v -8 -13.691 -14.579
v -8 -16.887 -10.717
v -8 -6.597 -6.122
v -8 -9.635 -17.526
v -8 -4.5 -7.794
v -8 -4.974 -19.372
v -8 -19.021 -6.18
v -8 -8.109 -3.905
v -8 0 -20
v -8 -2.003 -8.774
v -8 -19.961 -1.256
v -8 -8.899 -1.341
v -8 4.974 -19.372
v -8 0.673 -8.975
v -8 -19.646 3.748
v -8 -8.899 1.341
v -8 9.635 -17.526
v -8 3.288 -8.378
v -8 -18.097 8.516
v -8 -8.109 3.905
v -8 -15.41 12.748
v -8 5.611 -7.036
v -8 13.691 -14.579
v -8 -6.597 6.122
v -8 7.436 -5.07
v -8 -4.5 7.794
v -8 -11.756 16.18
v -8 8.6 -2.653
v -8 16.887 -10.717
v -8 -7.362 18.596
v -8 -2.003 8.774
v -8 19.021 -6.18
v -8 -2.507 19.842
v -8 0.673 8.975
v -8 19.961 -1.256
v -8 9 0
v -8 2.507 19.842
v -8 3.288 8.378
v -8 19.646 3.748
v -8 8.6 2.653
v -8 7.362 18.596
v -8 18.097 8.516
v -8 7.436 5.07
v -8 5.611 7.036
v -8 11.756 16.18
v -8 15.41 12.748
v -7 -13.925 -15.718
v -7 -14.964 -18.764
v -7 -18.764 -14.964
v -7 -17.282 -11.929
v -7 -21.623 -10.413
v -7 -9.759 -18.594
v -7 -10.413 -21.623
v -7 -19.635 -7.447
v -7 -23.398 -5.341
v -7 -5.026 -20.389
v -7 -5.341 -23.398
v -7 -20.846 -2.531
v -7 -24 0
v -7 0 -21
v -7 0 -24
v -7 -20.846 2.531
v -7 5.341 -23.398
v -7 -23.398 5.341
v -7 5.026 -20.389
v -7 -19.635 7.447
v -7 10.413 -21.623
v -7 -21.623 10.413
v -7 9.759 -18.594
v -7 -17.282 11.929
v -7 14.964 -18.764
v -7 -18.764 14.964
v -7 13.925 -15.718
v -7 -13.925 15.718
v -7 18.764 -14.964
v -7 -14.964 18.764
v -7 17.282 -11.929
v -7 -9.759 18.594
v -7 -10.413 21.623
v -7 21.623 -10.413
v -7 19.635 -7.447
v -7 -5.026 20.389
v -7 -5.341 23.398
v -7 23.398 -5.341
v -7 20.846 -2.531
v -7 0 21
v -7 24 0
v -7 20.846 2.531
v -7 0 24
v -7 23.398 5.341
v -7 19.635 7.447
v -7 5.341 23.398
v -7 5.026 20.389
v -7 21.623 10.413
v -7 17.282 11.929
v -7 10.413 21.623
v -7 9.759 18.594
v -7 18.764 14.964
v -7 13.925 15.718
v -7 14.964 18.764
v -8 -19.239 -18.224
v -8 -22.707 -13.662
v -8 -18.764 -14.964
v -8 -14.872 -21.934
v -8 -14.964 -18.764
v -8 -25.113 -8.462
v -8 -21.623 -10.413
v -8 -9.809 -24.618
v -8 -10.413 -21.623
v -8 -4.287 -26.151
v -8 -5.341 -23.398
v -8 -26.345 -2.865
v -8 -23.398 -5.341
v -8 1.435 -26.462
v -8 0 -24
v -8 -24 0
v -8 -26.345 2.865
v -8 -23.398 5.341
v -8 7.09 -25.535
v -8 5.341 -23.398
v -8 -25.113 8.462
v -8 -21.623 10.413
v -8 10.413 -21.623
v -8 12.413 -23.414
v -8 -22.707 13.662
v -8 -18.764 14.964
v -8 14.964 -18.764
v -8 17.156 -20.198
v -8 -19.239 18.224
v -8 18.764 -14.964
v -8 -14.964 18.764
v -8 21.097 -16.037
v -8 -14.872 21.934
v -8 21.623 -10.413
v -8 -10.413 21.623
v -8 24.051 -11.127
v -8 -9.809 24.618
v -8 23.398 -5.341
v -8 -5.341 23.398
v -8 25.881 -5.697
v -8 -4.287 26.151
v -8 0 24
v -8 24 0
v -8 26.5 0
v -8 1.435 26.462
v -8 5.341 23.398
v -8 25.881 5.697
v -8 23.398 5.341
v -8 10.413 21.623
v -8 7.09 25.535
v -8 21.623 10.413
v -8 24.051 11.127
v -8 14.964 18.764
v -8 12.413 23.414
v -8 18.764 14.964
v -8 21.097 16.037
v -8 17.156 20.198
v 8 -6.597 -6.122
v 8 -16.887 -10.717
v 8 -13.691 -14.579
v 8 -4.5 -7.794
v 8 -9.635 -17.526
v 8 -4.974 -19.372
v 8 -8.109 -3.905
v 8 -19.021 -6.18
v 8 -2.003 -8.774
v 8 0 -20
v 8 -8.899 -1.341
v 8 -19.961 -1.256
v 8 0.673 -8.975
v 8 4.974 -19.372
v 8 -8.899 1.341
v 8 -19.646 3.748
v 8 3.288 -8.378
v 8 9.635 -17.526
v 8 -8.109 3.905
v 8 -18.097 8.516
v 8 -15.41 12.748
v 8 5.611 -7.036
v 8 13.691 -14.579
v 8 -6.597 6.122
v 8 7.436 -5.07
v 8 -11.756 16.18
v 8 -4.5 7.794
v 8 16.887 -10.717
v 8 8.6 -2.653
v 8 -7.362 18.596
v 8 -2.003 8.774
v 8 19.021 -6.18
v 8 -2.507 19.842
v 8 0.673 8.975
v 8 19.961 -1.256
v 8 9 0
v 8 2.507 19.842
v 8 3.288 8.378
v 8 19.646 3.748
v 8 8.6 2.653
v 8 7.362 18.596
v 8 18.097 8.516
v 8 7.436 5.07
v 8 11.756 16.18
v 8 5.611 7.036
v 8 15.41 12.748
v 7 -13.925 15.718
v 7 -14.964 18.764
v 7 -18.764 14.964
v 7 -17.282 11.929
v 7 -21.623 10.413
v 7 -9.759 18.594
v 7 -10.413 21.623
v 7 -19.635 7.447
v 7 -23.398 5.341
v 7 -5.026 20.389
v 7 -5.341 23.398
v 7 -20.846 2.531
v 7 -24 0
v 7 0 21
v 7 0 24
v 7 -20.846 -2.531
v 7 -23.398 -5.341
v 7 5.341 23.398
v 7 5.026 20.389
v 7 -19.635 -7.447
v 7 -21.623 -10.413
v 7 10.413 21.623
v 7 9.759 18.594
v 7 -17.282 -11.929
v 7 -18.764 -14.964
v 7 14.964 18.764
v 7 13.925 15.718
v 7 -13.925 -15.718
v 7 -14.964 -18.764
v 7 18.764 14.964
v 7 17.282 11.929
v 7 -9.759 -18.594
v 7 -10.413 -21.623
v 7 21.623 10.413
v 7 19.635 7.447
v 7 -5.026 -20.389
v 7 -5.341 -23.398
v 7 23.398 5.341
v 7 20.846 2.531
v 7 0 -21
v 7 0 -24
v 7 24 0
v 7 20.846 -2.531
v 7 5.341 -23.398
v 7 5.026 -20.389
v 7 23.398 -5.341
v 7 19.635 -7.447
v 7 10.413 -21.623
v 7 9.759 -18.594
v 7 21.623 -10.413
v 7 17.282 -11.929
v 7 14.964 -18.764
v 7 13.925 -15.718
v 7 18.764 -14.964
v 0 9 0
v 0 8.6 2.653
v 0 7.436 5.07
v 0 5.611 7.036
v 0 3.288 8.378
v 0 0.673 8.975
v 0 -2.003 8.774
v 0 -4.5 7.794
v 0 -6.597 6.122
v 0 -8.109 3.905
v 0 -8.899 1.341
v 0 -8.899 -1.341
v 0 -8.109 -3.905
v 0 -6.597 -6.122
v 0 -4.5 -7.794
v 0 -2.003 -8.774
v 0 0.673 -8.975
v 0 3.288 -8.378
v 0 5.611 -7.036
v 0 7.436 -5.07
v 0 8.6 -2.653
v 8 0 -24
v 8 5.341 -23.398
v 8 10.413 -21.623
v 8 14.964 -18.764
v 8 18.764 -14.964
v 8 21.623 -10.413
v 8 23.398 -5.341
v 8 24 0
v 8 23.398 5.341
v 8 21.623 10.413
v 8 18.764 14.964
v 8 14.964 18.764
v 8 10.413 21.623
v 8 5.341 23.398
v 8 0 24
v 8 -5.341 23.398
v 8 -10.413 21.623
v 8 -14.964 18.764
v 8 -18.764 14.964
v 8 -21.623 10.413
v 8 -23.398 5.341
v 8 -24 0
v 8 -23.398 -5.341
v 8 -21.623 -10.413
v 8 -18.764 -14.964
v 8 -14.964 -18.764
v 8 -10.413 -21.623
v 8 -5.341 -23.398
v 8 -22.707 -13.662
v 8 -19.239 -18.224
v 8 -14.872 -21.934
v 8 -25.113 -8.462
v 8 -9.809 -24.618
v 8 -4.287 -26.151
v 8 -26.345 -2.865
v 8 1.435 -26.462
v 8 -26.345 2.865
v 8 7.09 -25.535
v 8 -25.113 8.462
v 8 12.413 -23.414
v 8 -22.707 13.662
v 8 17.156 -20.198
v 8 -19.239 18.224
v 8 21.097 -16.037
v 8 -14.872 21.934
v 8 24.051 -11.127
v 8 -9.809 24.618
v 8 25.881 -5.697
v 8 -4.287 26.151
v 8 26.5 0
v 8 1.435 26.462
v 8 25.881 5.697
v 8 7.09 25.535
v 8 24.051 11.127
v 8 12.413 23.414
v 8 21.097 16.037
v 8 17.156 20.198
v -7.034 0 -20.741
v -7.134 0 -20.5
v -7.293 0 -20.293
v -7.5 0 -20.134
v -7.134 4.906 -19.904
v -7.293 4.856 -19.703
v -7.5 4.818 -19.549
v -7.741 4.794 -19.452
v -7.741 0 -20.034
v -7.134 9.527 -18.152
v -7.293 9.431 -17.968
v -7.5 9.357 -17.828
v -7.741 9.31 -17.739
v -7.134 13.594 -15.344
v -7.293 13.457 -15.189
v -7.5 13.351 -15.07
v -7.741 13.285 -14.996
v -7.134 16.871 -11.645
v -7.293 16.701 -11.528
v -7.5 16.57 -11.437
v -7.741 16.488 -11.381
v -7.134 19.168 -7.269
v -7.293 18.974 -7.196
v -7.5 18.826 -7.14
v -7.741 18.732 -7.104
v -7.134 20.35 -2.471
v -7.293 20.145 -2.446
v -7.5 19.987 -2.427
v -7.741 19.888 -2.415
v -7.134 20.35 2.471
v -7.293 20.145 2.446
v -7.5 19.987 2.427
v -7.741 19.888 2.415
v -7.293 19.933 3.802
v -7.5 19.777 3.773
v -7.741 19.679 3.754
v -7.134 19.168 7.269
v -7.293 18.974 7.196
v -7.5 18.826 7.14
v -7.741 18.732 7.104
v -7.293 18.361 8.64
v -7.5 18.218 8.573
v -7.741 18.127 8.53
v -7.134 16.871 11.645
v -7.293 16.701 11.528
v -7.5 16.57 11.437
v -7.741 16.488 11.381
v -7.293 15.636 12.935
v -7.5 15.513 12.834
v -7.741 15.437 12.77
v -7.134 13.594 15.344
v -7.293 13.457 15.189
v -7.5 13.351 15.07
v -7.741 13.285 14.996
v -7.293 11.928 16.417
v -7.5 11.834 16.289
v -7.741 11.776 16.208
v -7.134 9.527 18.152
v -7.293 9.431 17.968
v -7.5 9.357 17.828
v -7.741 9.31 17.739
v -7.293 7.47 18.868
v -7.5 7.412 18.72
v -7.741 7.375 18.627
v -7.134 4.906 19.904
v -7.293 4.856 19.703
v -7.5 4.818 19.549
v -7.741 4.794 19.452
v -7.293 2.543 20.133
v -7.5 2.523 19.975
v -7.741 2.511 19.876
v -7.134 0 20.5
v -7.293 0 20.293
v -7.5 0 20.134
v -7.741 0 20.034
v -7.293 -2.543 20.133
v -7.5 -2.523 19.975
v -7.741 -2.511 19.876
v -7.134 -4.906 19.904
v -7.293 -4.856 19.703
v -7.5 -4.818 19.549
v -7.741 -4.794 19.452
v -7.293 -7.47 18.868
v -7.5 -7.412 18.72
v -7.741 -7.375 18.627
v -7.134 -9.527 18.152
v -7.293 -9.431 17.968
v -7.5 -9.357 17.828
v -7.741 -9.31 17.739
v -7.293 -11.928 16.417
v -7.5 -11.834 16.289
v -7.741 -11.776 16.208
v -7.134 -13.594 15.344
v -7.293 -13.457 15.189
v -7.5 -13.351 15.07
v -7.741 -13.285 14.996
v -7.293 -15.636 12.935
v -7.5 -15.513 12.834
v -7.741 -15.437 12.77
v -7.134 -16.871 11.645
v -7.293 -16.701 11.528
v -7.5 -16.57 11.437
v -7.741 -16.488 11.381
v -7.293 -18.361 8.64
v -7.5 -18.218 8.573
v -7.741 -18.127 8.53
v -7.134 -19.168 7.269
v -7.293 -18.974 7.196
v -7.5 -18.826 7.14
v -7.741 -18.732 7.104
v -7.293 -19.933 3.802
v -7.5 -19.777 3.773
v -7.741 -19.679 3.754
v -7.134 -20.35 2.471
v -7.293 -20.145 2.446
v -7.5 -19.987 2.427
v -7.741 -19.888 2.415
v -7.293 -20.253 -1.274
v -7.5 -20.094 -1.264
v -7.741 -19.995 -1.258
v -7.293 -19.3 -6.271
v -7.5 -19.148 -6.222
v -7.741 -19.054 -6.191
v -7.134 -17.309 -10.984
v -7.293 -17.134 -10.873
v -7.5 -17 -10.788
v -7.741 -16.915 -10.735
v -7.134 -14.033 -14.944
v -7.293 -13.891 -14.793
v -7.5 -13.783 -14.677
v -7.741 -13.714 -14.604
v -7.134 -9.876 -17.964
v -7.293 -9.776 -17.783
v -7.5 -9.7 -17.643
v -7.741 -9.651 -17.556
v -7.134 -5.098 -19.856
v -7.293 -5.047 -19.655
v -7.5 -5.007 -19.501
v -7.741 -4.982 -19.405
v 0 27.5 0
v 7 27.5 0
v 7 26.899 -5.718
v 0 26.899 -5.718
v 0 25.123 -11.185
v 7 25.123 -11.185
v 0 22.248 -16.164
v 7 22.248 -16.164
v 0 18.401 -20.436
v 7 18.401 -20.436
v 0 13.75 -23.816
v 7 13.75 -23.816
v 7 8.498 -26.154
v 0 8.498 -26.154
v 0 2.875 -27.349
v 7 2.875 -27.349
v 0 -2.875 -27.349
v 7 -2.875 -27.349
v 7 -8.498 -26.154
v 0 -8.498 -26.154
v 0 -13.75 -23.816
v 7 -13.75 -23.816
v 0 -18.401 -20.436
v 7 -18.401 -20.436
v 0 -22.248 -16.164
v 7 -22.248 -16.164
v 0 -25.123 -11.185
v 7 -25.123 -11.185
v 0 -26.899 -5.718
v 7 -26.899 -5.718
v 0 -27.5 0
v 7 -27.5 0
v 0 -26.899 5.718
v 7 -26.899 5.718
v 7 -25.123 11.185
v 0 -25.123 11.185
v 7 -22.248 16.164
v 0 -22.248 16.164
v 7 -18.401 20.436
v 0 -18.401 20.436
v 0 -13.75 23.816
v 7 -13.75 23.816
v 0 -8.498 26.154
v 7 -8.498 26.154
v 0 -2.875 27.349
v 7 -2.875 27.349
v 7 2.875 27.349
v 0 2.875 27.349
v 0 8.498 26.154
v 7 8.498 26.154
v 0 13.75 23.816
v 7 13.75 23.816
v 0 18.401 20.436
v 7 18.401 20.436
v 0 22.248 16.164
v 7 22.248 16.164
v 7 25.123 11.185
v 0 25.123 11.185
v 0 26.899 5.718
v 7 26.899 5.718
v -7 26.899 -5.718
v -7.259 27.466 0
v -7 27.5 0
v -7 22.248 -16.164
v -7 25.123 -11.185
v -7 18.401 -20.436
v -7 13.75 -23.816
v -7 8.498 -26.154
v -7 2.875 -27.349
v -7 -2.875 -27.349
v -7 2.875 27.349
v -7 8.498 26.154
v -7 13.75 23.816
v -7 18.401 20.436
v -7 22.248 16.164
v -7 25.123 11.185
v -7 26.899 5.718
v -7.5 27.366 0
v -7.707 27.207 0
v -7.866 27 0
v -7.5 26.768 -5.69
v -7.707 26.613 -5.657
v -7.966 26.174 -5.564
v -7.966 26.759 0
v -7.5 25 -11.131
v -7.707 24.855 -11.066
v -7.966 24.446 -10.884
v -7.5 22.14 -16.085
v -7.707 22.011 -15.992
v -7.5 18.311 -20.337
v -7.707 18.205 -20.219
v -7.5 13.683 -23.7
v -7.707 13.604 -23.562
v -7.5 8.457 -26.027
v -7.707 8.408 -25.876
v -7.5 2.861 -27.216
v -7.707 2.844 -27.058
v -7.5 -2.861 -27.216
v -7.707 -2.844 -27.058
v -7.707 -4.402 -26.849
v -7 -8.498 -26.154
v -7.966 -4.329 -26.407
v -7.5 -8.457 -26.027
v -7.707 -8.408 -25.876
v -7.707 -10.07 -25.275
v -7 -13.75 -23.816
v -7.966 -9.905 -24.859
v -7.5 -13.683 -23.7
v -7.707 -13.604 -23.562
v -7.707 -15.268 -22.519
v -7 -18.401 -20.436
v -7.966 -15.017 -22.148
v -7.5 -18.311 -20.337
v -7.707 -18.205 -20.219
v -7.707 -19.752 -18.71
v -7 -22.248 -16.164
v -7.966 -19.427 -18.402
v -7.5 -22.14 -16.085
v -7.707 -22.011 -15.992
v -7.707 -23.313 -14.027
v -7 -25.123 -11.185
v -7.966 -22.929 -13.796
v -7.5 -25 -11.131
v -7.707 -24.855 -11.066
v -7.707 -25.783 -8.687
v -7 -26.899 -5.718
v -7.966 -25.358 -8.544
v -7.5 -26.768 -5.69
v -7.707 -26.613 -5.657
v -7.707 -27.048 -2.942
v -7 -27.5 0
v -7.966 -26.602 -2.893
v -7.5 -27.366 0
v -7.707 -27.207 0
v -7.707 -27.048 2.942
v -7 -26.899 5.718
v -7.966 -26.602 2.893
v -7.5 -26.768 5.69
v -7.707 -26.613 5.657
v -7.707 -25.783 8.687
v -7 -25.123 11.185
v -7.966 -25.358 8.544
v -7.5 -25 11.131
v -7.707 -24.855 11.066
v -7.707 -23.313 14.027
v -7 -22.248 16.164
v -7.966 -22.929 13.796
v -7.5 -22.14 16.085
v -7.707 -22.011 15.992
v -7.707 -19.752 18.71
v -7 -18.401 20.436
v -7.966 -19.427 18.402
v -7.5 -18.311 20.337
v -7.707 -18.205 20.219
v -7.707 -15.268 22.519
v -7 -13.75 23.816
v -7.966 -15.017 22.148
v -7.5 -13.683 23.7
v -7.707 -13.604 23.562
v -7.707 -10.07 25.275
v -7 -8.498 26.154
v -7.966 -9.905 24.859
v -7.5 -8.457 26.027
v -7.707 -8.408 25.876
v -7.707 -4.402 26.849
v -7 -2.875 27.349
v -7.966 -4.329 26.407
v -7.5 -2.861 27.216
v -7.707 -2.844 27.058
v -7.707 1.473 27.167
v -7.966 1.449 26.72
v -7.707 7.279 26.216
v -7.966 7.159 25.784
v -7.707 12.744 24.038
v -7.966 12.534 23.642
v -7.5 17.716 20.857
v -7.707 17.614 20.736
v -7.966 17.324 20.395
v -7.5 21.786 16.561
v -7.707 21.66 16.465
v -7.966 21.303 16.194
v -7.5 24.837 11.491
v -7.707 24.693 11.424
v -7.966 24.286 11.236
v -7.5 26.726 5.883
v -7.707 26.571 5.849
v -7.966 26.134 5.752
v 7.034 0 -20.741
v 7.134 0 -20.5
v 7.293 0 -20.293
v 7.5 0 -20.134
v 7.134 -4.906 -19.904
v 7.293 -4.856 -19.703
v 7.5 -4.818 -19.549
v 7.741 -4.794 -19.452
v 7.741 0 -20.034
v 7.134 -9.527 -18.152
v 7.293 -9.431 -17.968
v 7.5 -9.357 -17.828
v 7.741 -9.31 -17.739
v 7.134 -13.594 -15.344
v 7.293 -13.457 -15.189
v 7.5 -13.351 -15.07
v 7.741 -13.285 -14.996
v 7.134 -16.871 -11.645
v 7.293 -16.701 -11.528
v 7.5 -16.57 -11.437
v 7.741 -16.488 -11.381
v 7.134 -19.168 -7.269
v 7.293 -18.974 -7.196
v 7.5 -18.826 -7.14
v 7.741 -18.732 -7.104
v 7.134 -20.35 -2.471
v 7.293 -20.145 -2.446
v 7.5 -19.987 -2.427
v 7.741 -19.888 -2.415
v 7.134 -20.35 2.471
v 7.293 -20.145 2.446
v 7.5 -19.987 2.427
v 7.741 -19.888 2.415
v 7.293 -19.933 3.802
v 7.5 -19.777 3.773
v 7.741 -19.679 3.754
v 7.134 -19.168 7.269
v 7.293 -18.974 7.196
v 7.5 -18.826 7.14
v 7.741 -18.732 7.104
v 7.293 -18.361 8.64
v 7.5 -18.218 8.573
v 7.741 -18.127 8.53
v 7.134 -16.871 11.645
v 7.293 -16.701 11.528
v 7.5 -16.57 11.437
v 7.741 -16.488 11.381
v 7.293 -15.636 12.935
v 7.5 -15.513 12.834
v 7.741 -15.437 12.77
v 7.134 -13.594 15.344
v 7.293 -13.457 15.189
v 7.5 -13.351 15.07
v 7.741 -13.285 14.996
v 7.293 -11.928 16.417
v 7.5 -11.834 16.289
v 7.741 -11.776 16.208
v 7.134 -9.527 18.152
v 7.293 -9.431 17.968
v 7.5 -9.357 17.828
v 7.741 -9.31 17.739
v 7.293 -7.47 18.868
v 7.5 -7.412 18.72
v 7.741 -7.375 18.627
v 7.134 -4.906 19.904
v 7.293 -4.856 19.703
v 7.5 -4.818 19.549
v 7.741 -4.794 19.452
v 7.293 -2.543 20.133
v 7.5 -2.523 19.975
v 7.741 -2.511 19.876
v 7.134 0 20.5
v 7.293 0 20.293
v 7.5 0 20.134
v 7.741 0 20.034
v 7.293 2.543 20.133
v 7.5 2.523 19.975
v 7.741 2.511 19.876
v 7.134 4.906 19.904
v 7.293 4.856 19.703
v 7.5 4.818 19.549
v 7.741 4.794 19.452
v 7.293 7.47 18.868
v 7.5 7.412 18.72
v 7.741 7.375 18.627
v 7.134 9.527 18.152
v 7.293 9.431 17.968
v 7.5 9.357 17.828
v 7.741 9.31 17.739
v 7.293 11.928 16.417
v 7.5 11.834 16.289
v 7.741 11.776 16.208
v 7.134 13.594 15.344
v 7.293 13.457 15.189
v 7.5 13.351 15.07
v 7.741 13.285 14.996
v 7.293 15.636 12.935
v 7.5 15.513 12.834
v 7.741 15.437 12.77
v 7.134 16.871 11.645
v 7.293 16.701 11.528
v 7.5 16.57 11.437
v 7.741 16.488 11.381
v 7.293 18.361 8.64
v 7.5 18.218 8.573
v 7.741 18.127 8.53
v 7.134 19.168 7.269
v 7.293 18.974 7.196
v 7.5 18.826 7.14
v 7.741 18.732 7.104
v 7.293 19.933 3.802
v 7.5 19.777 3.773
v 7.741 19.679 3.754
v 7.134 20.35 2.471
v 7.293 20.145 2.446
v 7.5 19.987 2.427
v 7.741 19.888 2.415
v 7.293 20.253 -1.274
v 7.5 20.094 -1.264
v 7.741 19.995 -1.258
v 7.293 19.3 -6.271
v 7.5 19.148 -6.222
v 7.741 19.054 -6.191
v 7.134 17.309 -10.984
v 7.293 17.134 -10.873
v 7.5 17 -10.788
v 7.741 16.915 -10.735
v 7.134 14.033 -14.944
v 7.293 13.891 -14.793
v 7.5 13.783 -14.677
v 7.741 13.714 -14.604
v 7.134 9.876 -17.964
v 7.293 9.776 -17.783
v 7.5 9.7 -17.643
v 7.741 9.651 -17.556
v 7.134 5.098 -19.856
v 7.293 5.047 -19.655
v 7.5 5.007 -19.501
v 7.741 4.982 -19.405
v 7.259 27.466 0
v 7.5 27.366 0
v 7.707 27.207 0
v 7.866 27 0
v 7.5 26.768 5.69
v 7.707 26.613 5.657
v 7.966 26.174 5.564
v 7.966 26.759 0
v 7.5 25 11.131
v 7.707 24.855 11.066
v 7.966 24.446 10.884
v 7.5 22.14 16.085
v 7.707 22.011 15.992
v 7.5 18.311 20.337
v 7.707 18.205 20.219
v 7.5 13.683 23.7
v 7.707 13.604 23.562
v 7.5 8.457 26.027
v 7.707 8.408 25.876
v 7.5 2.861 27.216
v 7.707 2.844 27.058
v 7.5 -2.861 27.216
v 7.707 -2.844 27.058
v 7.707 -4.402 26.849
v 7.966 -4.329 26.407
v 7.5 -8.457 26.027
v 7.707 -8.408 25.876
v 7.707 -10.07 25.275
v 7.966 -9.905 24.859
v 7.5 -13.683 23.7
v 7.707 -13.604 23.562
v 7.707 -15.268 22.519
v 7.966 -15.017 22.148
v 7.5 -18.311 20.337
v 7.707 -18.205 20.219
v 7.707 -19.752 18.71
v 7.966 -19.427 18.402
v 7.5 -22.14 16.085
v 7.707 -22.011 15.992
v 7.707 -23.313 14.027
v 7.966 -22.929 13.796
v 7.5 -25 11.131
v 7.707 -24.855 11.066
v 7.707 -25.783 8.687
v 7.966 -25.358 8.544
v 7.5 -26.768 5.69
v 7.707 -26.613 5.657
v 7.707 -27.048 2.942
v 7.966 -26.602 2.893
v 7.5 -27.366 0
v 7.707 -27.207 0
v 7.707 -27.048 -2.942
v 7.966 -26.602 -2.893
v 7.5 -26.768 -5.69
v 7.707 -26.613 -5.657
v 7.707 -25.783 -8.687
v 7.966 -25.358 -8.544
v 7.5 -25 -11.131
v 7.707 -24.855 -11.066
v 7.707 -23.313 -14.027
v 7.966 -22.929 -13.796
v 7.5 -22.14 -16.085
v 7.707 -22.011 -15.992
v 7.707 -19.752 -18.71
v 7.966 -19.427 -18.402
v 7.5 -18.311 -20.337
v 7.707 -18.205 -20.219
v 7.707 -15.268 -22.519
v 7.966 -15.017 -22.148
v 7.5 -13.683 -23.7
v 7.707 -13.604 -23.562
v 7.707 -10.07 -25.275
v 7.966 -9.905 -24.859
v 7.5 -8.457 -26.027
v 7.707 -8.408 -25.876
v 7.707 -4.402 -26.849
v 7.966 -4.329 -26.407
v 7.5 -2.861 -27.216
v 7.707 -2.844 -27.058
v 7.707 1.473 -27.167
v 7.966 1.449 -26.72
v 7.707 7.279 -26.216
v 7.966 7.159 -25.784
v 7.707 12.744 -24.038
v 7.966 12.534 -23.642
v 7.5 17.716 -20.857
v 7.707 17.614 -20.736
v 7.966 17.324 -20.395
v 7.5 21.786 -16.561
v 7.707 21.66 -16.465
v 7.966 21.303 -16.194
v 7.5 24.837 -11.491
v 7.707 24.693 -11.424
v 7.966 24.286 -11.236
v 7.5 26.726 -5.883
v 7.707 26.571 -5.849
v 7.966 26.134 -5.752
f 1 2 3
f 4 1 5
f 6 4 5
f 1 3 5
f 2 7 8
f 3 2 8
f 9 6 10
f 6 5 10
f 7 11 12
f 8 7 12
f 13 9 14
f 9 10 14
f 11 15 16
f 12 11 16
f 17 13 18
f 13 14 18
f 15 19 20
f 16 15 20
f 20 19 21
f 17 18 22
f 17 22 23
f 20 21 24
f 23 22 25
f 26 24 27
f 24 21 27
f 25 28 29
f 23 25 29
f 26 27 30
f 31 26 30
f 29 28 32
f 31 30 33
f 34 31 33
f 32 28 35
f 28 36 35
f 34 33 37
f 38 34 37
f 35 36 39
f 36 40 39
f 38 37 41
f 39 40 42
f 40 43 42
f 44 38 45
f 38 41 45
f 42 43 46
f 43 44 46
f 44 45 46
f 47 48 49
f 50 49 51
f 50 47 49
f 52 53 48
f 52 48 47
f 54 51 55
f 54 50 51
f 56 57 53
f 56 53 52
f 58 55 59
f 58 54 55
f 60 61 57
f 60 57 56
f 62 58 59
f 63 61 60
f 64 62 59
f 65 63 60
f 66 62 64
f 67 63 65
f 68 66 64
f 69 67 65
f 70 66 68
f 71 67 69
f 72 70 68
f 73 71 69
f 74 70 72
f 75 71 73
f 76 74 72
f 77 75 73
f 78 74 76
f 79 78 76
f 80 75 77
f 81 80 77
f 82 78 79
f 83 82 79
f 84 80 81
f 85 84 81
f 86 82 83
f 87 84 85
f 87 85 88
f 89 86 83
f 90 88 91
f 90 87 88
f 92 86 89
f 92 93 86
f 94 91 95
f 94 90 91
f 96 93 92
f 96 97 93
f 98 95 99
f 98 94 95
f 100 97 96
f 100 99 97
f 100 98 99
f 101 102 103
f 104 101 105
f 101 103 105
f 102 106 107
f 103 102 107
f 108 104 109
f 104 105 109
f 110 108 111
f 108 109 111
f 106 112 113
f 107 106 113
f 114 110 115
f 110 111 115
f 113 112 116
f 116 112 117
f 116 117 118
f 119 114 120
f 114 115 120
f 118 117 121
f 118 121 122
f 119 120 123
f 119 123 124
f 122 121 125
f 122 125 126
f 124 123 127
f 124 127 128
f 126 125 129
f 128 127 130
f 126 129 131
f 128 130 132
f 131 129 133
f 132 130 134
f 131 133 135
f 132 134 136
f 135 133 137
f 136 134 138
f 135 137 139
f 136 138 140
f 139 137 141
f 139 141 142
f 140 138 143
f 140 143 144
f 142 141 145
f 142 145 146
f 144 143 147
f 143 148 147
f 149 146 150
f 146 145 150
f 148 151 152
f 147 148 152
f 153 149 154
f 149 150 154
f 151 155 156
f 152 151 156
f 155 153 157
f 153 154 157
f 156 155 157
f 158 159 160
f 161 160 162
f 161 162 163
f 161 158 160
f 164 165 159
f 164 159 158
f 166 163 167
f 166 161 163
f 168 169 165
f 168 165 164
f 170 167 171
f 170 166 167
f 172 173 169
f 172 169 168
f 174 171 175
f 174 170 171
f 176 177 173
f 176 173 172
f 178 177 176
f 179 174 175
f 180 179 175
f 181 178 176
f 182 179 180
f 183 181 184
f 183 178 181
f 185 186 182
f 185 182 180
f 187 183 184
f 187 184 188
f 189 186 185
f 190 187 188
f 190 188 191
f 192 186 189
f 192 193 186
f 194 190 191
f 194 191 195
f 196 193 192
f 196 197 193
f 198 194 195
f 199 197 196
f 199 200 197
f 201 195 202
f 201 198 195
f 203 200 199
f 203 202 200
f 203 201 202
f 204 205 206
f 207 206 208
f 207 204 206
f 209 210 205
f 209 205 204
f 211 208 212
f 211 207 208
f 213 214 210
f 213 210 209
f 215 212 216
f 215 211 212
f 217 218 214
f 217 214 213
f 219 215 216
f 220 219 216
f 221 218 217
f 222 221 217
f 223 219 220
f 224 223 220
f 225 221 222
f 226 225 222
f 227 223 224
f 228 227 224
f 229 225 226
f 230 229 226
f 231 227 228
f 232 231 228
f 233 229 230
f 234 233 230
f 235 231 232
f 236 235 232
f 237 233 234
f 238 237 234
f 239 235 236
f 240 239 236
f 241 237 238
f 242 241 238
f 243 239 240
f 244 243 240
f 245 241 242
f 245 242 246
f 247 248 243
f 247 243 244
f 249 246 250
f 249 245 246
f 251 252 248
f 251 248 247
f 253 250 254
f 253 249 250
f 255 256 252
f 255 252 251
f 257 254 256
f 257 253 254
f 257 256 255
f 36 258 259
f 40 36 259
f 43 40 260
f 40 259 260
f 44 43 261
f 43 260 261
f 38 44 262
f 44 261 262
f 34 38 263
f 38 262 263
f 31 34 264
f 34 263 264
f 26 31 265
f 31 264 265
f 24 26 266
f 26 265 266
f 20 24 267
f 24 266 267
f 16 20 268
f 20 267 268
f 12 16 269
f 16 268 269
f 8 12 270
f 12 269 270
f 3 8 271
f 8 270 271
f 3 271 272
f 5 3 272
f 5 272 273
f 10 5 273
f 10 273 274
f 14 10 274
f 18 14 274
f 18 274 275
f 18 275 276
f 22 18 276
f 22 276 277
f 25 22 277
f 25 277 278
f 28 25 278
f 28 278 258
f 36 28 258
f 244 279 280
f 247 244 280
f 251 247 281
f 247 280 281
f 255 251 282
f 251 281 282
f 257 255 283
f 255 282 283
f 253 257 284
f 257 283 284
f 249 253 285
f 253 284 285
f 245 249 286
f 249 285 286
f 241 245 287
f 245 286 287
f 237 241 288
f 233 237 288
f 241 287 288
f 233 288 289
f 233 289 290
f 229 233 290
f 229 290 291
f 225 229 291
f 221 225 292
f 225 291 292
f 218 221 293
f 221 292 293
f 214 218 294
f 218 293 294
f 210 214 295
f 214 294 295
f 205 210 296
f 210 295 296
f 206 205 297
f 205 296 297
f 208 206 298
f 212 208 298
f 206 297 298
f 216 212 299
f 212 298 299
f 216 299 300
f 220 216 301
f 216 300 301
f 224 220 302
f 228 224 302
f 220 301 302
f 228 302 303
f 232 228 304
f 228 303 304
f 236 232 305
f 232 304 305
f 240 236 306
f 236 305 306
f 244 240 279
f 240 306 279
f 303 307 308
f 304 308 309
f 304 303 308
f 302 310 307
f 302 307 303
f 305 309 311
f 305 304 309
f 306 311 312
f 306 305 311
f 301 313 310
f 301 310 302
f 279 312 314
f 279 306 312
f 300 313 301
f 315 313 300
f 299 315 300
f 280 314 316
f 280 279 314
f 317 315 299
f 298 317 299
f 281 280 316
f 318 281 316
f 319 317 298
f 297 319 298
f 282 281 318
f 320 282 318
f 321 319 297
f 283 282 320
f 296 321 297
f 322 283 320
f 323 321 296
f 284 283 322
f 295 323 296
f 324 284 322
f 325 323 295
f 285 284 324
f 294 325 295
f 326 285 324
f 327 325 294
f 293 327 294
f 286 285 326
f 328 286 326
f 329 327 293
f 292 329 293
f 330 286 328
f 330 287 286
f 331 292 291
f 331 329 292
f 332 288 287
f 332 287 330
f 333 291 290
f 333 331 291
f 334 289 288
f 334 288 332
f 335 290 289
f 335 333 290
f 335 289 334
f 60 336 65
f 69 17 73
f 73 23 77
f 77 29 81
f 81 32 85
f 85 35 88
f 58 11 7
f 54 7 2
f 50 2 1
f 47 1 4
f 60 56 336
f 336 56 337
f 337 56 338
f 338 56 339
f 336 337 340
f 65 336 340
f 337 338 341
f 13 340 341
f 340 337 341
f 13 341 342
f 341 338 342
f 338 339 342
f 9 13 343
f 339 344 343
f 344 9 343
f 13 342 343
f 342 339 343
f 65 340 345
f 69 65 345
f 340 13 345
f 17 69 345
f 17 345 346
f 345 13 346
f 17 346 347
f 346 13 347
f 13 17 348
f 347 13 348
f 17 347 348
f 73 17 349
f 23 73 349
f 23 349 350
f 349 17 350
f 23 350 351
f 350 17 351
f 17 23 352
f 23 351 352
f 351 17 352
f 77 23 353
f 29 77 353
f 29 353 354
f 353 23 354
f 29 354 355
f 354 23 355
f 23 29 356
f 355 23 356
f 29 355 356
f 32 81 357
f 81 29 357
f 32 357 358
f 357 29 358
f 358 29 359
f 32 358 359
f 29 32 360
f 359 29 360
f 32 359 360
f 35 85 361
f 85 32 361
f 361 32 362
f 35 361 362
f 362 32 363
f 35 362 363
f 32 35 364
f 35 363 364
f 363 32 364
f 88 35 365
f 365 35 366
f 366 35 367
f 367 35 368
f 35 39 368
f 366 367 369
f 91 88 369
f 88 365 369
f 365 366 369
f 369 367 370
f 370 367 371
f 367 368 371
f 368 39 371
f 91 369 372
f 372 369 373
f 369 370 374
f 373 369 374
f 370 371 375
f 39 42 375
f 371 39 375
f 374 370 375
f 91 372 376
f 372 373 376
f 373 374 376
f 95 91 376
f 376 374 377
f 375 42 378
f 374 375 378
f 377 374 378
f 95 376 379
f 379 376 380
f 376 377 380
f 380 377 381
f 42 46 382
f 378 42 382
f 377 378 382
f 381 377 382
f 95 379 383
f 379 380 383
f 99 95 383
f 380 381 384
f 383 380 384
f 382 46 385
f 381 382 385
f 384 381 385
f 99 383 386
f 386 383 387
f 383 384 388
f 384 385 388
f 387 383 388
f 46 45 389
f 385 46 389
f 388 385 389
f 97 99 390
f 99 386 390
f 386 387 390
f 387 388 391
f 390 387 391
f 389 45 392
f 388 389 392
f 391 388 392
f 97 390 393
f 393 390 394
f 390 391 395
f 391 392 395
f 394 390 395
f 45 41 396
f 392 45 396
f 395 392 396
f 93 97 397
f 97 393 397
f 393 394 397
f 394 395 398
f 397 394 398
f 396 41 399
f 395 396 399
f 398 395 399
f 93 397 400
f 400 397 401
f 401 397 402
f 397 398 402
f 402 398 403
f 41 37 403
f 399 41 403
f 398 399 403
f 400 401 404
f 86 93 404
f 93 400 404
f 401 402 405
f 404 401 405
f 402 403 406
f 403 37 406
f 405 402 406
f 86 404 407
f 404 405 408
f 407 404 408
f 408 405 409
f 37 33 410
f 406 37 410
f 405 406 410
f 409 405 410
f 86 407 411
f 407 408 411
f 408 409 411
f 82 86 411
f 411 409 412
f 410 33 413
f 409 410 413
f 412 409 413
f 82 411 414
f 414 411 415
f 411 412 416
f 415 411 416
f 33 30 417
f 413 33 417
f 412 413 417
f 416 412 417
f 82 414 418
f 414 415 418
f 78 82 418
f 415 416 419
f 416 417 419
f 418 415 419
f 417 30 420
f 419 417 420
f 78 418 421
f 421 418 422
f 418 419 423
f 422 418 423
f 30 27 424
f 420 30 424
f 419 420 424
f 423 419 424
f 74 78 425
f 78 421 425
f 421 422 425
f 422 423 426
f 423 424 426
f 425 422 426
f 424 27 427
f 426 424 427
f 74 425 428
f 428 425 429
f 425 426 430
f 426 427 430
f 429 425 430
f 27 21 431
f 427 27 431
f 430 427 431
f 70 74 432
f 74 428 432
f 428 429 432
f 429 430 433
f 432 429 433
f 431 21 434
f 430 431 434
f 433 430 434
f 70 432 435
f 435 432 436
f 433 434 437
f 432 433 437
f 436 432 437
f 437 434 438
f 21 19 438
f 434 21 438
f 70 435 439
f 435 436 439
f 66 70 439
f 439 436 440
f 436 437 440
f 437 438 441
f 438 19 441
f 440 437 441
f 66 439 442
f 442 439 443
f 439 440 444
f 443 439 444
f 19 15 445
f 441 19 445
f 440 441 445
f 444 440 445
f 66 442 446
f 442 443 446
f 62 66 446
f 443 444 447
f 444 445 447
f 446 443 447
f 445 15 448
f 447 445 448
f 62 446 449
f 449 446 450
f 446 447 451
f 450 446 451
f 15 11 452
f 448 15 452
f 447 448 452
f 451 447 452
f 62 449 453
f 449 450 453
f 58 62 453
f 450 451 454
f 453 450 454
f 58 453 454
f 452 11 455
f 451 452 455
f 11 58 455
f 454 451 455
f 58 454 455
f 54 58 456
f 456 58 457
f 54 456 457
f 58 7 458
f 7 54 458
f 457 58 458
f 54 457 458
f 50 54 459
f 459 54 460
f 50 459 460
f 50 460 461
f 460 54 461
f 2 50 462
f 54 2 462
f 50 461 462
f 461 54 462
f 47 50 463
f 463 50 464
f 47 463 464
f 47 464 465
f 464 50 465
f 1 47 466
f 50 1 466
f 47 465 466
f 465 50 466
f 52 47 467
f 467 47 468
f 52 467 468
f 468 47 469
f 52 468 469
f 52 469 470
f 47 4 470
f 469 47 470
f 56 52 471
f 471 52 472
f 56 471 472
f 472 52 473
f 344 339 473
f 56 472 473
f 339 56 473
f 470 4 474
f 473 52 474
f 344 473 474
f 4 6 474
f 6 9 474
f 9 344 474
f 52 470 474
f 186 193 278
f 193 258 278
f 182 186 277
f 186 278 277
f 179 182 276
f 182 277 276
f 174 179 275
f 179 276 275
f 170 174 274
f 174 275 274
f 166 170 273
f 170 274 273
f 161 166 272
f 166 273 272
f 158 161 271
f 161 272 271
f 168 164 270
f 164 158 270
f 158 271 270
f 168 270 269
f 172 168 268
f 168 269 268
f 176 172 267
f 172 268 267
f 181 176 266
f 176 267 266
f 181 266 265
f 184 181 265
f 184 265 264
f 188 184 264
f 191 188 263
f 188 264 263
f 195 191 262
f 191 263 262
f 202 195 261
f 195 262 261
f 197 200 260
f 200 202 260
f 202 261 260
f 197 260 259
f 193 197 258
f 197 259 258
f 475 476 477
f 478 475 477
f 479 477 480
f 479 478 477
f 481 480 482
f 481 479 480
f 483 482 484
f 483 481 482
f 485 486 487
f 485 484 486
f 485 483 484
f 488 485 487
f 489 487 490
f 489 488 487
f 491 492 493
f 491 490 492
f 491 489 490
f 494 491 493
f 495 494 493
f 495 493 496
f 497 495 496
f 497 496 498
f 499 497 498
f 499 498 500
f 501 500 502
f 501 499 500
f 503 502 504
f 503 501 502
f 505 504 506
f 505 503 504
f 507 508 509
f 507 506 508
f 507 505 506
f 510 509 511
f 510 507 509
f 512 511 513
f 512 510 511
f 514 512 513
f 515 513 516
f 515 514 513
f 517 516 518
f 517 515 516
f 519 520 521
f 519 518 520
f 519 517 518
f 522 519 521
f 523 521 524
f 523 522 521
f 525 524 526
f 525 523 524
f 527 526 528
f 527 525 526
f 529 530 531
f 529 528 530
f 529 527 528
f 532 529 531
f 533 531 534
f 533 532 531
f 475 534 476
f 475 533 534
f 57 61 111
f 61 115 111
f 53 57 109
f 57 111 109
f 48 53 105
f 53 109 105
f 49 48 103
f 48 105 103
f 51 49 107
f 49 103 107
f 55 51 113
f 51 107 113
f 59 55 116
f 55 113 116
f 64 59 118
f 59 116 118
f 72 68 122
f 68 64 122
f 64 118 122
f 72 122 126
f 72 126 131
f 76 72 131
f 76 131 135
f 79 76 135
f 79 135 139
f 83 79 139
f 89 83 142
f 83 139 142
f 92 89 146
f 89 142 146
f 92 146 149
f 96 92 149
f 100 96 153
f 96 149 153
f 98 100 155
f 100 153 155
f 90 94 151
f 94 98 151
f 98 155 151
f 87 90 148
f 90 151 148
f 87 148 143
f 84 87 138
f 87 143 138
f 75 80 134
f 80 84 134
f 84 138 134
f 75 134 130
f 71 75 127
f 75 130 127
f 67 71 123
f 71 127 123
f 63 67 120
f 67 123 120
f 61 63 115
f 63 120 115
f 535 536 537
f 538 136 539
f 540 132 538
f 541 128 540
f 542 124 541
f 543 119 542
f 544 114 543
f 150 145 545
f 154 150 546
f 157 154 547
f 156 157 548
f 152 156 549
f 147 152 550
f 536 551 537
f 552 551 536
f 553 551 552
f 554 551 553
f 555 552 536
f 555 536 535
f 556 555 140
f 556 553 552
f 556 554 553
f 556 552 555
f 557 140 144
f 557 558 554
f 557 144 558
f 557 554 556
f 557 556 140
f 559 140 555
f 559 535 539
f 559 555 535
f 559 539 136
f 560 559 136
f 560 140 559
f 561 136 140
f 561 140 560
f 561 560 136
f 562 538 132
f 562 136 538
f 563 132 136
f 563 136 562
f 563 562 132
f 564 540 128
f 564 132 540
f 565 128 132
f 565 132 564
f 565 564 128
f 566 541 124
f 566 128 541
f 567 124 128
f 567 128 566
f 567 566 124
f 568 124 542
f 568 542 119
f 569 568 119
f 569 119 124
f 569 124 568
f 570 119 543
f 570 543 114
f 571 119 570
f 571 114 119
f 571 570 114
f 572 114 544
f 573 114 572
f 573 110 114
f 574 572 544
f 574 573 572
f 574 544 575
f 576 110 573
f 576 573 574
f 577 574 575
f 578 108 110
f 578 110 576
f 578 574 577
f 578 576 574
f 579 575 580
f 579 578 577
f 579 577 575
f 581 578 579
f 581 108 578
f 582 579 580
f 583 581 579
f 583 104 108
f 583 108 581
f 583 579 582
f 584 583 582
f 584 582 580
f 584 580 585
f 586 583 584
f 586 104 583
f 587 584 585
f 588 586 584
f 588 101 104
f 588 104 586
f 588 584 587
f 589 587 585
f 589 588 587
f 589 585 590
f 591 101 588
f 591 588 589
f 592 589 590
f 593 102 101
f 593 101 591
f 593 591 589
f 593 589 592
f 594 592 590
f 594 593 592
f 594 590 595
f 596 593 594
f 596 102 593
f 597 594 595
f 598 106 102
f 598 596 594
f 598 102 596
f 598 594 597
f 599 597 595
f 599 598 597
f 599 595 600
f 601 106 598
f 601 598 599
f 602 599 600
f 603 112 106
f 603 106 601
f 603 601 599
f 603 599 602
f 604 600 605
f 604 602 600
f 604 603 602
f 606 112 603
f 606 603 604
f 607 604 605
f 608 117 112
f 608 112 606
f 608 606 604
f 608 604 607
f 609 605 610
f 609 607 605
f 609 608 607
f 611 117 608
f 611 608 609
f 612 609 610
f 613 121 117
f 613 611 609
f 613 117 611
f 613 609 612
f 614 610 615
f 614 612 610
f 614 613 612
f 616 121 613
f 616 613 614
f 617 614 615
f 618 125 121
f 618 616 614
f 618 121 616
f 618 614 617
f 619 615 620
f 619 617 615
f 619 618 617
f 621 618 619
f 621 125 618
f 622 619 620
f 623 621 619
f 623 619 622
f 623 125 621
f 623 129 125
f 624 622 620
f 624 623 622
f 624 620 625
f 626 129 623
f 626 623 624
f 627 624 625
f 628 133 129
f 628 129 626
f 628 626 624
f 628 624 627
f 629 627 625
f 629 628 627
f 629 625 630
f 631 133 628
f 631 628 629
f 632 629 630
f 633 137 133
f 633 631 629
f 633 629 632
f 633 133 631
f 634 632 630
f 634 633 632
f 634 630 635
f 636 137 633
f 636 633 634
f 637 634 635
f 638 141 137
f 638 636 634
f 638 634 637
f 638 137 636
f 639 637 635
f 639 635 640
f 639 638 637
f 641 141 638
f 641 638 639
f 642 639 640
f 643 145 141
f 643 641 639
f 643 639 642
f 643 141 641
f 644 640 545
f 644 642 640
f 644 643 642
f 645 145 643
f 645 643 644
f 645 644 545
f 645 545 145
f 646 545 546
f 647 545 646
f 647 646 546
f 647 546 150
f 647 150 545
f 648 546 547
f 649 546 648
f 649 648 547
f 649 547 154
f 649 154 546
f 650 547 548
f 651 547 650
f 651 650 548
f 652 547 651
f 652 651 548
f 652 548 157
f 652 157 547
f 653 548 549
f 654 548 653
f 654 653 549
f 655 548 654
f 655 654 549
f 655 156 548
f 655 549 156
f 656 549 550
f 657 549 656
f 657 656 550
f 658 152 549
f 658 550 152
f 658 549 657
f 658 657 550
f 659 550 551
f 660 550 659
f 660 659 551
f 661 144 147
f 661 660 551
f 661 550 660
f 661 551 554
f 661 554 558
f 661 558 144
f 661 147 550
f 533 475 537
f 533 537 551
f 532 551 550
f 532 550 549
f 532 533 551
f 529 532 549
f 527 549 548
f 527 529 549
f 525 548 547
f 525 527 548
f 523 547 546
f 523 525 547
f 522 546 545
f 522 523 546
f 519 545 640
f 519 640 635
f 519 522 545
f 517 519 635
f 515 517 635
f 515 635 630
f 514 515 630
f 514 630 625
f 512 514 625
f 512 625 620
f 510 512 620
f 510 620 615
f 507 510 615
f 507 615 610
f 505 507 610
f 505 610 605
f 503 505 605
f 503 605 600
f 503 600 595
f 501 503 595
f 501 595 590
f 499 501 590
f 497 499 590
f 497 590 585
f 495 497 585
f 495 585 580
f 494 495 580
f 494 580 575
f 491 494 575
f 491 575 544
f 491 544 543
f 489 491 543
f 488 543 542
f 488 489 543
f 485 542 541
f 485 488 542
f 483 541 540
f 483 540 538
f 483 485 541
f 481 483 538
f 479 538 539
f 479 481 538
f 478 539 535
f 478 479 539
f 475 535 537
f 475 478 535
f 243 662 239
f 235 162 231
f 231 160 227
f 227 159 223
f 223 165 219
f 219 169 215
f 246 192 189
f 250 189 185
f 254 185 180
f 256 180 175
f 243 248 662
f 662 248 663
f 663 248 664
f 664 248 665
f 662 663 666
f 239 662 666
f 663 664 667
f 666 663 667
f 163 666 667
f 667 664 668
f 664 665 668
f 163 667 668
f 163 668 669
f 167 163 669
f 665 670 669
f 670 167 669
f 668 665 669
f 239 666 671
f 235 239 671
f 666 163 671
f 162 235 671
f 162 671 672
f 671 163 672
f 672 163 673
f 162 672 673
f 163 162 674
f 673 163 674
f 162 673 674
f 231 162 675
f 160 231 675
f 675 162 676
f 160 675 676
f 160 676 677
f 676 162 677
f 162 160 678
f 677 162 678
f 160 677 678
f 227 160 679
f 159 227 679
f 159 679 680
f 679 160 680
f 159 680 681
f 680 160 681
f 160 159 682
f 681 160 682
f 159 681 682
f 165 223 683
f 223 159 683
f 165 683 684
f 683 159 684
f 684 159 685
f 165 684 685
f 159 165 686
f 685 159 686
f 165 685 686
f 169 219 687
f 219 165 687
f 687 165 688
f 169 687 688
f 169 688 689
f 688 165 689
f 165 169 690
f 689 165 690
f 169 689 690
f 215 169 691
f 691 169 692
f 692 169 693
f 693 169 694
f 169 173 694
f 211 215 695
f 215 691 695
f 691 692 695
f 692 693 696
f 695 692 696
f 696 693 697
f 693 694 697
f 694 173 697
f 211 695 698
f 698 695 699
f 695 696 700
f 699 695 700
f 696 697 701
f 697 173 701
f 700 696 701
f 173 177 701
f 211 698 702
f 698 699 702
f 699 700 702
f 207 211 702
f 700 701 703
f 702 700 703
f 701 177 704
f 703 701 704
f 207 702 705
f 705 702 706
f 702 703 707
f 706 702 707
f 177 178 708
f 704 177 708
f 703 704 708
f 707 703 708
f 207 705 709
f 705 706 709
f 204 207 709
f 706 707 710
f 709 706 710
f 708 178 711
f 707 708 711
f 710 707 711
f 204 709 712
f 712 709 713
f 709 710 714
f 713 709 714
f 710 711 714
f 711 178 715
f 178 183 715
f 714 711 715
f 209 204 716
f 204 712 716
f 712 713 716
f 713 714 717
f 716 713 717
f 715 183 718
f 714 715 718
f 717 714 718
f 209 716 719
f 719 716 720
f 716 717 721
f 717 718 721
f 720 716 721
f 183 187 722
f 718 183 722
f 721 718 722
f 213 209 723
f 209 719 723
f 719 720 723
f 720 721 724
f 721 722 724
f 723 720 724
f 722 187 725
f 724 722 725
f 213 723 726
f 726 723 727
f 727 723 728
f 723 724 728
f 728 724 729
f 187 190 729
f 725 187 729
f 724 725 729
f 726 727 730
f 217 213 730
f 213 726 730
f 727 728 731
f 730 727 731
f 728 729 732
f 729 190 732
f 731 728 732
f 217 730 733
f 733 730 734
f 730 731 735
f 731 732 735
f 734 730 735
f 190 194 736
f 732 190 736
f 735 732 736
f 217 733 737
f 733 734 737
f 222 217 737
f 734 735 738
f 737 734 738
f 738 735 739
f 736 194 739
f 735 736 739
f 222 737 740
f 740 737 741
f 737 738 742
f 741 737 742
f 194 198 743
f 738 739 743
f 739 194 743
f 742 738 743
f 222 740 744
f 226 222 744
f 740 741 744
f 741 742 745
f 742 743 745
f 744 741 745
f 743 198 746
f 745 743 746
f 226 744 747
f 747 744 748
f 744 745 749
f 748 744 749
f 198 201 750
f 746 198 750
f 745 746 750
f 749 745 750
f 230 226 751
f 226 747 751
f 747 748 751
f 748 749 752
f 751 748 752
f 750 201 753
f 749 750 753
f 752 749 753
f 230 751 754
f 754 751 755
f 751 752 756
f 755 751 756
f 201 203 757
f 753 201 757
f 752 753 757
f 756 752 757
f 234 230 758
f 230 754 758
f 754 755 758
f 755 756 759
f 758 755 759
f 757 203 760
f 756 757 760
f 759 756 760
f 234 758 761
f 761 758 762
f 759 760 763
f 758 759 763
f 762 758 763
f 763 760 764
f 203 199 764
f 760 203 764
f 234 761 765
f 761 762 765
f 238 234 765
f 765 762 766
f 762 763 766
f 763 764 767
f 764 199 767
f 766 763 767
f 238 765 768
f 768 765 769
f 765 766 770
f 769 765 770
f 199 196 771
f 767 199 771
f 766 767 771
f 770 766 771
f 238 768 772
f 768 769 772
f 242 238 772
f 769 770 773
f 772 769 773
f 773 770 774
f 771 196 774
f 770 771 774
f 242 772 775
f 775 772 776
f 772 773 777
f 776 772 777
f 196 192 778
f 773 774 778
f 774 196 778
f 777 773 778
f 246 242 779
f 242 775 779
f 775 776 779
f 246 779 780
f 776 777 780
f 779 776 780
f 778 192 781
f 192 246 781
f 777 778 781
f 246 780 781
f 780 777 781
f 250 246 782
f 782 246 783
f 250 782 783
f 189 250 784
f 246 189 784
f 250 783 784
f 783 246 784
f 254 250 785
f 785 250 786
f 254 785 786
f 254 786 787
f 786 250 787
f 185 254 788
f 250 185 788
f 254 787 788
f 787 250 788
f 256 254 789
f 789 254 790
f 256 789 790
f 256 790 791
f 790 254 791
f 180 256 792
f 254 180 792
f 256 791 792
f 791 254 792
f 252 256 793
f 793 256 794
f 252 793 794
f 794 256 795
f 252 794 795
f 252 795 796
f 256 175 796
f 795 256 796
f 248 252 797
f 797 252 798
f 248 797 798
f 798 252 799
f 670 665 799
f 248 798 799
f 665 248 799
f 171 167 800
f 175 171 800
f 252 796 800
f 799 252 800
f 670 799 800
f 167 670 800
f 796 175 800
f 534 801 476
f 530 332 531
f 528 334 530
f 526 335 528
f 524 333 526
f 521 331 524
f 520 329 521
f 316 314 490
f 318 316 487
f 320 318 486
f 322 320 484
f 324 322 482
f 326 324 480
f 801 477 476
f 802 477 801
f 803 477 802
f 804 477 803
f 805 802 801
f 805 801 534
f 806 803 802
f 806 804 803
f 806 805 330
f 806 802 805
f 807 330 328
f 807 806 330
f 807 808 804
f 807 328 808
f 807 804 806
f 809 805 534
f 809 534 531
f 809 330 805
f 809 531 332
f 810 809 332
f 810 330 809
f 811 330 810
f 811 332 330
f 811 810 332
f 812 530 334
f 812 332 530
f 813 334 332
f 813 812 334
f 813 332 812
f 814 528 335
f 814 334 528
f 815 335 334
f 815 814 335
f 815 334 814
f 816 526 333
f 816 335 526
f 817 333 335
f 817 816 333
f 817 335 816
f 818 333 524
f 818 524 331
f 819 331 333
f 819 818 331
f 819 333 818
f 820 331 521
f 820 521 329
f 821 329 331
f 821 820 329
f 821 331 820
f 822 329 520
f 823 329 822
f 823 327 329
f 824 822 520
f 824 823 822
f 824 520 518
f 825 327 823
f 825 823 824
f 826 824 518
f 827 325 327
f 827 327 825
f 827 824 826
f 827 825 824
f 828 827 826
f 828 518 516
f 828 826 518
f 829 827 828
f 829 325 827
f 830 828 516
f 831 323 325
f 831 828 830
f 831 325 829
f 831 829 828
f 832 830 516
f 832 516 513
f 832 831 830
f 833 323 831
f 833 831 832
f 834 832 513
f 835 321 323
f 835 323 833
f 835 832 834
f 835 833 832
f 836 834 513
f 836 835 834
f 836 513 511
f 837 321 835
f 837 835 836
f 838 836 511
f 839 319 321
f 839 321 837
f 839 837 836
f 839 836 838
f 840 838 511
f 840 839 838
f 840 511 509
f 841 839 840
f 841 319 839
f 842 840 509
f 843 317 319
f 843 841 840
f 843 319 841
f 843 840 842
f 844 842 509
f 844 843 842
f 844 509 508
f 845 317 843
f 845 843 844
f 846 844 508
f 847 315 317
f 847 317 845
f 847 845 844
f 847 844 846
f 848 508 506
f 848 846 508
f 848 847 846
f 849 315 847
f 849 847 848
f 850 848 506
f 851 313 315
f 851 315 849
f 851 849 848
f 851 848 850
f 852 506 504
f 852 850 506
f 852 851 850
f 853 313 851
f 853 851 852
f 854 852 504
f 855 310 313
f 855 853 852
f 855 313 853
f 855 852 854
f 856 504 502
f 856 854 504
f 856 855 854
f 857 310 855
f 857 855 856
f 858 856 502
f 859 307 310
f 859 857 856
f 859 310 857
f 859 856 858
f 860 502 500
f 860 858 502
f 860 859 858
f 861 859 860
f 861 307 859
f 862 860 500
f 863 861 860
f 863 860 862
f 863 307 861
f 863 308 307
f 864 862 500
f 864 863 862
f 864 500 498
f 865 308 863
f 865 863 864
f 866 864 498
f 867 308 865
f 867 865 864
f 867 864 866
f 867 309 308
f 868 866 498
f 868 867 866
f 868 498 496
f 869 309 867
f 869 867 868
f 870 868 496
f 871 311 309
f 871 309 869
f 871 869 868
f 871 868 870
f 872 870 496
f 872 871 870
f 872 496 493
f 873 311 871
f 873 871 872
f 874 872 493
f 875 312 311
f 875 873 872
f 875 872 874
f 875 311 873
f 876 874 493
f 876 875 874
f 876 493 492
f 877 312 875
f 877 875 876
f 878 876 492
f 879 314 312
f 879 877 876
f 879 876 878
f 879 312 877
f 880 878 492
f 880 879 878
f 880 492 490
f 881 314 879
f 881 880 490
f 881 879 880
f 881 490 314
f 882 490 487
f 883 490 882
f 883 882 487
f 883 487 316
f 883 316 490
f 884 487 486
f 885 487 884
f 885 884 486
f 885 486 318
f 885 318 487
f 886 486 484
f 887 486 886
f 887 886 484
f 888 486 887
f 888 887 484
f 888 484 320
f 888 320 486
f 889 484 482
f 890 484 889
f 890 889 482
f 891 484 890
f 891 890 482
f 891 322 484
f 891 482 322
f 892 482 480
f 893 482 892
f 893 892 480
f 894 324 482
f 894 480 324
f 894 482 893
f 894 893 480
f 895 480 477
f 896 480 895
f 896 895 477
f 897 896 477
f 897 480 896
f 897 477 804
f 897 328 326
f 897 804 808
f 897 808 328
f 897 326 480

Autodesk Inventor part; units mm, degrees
ref_plane "YZ Plane" through (0, 0, 0) normal (1, 0, 0) x (0, 1, 0)
ref_plane "XZ Plane" through (0, 0, 0) normal (0, 1, 0) x (-1, 0, 0)
ref_plane "XY Plane" through (0, 0, 0) normal (0, 0, 1) x (1, 0, 0)
sketch "Sketch1" plane through (0, 0, 0) normal (1, 0, 0) x (0, 1, 0)
  circle A0 centre (0, 0) radius 9
  circle A1 centre (0, 0) radius 27.5
  dimension "d1" = 18
  dimension "d2" = 55
extrude "Extrusion1" add sketch "Sketch1" along normal mid plane 16
sketch "Sketch2" plane through (8, 0, 0) normal (1, 0, 0) x (0, 0, -1)
  circle A0 centre (0, 0) radius 20
  circle A1 centre (0, 0) radius 24
  dimension "d5" = 48
  dimension "d6" = 40
extrude "Extrusion2" cut sketch "Sketch2" against normal blind 1
mirror "Mirror1" about plane through (0, 0, 0) normal (1, 0, 0) of "Extrusion2"
fillet "Fillet1" radius 1 4 edges at (8, -27.5, 0) (7, 0, 20) (-8, -27.5, 0) (-7, 0, 20)
properties part number "362-02"
